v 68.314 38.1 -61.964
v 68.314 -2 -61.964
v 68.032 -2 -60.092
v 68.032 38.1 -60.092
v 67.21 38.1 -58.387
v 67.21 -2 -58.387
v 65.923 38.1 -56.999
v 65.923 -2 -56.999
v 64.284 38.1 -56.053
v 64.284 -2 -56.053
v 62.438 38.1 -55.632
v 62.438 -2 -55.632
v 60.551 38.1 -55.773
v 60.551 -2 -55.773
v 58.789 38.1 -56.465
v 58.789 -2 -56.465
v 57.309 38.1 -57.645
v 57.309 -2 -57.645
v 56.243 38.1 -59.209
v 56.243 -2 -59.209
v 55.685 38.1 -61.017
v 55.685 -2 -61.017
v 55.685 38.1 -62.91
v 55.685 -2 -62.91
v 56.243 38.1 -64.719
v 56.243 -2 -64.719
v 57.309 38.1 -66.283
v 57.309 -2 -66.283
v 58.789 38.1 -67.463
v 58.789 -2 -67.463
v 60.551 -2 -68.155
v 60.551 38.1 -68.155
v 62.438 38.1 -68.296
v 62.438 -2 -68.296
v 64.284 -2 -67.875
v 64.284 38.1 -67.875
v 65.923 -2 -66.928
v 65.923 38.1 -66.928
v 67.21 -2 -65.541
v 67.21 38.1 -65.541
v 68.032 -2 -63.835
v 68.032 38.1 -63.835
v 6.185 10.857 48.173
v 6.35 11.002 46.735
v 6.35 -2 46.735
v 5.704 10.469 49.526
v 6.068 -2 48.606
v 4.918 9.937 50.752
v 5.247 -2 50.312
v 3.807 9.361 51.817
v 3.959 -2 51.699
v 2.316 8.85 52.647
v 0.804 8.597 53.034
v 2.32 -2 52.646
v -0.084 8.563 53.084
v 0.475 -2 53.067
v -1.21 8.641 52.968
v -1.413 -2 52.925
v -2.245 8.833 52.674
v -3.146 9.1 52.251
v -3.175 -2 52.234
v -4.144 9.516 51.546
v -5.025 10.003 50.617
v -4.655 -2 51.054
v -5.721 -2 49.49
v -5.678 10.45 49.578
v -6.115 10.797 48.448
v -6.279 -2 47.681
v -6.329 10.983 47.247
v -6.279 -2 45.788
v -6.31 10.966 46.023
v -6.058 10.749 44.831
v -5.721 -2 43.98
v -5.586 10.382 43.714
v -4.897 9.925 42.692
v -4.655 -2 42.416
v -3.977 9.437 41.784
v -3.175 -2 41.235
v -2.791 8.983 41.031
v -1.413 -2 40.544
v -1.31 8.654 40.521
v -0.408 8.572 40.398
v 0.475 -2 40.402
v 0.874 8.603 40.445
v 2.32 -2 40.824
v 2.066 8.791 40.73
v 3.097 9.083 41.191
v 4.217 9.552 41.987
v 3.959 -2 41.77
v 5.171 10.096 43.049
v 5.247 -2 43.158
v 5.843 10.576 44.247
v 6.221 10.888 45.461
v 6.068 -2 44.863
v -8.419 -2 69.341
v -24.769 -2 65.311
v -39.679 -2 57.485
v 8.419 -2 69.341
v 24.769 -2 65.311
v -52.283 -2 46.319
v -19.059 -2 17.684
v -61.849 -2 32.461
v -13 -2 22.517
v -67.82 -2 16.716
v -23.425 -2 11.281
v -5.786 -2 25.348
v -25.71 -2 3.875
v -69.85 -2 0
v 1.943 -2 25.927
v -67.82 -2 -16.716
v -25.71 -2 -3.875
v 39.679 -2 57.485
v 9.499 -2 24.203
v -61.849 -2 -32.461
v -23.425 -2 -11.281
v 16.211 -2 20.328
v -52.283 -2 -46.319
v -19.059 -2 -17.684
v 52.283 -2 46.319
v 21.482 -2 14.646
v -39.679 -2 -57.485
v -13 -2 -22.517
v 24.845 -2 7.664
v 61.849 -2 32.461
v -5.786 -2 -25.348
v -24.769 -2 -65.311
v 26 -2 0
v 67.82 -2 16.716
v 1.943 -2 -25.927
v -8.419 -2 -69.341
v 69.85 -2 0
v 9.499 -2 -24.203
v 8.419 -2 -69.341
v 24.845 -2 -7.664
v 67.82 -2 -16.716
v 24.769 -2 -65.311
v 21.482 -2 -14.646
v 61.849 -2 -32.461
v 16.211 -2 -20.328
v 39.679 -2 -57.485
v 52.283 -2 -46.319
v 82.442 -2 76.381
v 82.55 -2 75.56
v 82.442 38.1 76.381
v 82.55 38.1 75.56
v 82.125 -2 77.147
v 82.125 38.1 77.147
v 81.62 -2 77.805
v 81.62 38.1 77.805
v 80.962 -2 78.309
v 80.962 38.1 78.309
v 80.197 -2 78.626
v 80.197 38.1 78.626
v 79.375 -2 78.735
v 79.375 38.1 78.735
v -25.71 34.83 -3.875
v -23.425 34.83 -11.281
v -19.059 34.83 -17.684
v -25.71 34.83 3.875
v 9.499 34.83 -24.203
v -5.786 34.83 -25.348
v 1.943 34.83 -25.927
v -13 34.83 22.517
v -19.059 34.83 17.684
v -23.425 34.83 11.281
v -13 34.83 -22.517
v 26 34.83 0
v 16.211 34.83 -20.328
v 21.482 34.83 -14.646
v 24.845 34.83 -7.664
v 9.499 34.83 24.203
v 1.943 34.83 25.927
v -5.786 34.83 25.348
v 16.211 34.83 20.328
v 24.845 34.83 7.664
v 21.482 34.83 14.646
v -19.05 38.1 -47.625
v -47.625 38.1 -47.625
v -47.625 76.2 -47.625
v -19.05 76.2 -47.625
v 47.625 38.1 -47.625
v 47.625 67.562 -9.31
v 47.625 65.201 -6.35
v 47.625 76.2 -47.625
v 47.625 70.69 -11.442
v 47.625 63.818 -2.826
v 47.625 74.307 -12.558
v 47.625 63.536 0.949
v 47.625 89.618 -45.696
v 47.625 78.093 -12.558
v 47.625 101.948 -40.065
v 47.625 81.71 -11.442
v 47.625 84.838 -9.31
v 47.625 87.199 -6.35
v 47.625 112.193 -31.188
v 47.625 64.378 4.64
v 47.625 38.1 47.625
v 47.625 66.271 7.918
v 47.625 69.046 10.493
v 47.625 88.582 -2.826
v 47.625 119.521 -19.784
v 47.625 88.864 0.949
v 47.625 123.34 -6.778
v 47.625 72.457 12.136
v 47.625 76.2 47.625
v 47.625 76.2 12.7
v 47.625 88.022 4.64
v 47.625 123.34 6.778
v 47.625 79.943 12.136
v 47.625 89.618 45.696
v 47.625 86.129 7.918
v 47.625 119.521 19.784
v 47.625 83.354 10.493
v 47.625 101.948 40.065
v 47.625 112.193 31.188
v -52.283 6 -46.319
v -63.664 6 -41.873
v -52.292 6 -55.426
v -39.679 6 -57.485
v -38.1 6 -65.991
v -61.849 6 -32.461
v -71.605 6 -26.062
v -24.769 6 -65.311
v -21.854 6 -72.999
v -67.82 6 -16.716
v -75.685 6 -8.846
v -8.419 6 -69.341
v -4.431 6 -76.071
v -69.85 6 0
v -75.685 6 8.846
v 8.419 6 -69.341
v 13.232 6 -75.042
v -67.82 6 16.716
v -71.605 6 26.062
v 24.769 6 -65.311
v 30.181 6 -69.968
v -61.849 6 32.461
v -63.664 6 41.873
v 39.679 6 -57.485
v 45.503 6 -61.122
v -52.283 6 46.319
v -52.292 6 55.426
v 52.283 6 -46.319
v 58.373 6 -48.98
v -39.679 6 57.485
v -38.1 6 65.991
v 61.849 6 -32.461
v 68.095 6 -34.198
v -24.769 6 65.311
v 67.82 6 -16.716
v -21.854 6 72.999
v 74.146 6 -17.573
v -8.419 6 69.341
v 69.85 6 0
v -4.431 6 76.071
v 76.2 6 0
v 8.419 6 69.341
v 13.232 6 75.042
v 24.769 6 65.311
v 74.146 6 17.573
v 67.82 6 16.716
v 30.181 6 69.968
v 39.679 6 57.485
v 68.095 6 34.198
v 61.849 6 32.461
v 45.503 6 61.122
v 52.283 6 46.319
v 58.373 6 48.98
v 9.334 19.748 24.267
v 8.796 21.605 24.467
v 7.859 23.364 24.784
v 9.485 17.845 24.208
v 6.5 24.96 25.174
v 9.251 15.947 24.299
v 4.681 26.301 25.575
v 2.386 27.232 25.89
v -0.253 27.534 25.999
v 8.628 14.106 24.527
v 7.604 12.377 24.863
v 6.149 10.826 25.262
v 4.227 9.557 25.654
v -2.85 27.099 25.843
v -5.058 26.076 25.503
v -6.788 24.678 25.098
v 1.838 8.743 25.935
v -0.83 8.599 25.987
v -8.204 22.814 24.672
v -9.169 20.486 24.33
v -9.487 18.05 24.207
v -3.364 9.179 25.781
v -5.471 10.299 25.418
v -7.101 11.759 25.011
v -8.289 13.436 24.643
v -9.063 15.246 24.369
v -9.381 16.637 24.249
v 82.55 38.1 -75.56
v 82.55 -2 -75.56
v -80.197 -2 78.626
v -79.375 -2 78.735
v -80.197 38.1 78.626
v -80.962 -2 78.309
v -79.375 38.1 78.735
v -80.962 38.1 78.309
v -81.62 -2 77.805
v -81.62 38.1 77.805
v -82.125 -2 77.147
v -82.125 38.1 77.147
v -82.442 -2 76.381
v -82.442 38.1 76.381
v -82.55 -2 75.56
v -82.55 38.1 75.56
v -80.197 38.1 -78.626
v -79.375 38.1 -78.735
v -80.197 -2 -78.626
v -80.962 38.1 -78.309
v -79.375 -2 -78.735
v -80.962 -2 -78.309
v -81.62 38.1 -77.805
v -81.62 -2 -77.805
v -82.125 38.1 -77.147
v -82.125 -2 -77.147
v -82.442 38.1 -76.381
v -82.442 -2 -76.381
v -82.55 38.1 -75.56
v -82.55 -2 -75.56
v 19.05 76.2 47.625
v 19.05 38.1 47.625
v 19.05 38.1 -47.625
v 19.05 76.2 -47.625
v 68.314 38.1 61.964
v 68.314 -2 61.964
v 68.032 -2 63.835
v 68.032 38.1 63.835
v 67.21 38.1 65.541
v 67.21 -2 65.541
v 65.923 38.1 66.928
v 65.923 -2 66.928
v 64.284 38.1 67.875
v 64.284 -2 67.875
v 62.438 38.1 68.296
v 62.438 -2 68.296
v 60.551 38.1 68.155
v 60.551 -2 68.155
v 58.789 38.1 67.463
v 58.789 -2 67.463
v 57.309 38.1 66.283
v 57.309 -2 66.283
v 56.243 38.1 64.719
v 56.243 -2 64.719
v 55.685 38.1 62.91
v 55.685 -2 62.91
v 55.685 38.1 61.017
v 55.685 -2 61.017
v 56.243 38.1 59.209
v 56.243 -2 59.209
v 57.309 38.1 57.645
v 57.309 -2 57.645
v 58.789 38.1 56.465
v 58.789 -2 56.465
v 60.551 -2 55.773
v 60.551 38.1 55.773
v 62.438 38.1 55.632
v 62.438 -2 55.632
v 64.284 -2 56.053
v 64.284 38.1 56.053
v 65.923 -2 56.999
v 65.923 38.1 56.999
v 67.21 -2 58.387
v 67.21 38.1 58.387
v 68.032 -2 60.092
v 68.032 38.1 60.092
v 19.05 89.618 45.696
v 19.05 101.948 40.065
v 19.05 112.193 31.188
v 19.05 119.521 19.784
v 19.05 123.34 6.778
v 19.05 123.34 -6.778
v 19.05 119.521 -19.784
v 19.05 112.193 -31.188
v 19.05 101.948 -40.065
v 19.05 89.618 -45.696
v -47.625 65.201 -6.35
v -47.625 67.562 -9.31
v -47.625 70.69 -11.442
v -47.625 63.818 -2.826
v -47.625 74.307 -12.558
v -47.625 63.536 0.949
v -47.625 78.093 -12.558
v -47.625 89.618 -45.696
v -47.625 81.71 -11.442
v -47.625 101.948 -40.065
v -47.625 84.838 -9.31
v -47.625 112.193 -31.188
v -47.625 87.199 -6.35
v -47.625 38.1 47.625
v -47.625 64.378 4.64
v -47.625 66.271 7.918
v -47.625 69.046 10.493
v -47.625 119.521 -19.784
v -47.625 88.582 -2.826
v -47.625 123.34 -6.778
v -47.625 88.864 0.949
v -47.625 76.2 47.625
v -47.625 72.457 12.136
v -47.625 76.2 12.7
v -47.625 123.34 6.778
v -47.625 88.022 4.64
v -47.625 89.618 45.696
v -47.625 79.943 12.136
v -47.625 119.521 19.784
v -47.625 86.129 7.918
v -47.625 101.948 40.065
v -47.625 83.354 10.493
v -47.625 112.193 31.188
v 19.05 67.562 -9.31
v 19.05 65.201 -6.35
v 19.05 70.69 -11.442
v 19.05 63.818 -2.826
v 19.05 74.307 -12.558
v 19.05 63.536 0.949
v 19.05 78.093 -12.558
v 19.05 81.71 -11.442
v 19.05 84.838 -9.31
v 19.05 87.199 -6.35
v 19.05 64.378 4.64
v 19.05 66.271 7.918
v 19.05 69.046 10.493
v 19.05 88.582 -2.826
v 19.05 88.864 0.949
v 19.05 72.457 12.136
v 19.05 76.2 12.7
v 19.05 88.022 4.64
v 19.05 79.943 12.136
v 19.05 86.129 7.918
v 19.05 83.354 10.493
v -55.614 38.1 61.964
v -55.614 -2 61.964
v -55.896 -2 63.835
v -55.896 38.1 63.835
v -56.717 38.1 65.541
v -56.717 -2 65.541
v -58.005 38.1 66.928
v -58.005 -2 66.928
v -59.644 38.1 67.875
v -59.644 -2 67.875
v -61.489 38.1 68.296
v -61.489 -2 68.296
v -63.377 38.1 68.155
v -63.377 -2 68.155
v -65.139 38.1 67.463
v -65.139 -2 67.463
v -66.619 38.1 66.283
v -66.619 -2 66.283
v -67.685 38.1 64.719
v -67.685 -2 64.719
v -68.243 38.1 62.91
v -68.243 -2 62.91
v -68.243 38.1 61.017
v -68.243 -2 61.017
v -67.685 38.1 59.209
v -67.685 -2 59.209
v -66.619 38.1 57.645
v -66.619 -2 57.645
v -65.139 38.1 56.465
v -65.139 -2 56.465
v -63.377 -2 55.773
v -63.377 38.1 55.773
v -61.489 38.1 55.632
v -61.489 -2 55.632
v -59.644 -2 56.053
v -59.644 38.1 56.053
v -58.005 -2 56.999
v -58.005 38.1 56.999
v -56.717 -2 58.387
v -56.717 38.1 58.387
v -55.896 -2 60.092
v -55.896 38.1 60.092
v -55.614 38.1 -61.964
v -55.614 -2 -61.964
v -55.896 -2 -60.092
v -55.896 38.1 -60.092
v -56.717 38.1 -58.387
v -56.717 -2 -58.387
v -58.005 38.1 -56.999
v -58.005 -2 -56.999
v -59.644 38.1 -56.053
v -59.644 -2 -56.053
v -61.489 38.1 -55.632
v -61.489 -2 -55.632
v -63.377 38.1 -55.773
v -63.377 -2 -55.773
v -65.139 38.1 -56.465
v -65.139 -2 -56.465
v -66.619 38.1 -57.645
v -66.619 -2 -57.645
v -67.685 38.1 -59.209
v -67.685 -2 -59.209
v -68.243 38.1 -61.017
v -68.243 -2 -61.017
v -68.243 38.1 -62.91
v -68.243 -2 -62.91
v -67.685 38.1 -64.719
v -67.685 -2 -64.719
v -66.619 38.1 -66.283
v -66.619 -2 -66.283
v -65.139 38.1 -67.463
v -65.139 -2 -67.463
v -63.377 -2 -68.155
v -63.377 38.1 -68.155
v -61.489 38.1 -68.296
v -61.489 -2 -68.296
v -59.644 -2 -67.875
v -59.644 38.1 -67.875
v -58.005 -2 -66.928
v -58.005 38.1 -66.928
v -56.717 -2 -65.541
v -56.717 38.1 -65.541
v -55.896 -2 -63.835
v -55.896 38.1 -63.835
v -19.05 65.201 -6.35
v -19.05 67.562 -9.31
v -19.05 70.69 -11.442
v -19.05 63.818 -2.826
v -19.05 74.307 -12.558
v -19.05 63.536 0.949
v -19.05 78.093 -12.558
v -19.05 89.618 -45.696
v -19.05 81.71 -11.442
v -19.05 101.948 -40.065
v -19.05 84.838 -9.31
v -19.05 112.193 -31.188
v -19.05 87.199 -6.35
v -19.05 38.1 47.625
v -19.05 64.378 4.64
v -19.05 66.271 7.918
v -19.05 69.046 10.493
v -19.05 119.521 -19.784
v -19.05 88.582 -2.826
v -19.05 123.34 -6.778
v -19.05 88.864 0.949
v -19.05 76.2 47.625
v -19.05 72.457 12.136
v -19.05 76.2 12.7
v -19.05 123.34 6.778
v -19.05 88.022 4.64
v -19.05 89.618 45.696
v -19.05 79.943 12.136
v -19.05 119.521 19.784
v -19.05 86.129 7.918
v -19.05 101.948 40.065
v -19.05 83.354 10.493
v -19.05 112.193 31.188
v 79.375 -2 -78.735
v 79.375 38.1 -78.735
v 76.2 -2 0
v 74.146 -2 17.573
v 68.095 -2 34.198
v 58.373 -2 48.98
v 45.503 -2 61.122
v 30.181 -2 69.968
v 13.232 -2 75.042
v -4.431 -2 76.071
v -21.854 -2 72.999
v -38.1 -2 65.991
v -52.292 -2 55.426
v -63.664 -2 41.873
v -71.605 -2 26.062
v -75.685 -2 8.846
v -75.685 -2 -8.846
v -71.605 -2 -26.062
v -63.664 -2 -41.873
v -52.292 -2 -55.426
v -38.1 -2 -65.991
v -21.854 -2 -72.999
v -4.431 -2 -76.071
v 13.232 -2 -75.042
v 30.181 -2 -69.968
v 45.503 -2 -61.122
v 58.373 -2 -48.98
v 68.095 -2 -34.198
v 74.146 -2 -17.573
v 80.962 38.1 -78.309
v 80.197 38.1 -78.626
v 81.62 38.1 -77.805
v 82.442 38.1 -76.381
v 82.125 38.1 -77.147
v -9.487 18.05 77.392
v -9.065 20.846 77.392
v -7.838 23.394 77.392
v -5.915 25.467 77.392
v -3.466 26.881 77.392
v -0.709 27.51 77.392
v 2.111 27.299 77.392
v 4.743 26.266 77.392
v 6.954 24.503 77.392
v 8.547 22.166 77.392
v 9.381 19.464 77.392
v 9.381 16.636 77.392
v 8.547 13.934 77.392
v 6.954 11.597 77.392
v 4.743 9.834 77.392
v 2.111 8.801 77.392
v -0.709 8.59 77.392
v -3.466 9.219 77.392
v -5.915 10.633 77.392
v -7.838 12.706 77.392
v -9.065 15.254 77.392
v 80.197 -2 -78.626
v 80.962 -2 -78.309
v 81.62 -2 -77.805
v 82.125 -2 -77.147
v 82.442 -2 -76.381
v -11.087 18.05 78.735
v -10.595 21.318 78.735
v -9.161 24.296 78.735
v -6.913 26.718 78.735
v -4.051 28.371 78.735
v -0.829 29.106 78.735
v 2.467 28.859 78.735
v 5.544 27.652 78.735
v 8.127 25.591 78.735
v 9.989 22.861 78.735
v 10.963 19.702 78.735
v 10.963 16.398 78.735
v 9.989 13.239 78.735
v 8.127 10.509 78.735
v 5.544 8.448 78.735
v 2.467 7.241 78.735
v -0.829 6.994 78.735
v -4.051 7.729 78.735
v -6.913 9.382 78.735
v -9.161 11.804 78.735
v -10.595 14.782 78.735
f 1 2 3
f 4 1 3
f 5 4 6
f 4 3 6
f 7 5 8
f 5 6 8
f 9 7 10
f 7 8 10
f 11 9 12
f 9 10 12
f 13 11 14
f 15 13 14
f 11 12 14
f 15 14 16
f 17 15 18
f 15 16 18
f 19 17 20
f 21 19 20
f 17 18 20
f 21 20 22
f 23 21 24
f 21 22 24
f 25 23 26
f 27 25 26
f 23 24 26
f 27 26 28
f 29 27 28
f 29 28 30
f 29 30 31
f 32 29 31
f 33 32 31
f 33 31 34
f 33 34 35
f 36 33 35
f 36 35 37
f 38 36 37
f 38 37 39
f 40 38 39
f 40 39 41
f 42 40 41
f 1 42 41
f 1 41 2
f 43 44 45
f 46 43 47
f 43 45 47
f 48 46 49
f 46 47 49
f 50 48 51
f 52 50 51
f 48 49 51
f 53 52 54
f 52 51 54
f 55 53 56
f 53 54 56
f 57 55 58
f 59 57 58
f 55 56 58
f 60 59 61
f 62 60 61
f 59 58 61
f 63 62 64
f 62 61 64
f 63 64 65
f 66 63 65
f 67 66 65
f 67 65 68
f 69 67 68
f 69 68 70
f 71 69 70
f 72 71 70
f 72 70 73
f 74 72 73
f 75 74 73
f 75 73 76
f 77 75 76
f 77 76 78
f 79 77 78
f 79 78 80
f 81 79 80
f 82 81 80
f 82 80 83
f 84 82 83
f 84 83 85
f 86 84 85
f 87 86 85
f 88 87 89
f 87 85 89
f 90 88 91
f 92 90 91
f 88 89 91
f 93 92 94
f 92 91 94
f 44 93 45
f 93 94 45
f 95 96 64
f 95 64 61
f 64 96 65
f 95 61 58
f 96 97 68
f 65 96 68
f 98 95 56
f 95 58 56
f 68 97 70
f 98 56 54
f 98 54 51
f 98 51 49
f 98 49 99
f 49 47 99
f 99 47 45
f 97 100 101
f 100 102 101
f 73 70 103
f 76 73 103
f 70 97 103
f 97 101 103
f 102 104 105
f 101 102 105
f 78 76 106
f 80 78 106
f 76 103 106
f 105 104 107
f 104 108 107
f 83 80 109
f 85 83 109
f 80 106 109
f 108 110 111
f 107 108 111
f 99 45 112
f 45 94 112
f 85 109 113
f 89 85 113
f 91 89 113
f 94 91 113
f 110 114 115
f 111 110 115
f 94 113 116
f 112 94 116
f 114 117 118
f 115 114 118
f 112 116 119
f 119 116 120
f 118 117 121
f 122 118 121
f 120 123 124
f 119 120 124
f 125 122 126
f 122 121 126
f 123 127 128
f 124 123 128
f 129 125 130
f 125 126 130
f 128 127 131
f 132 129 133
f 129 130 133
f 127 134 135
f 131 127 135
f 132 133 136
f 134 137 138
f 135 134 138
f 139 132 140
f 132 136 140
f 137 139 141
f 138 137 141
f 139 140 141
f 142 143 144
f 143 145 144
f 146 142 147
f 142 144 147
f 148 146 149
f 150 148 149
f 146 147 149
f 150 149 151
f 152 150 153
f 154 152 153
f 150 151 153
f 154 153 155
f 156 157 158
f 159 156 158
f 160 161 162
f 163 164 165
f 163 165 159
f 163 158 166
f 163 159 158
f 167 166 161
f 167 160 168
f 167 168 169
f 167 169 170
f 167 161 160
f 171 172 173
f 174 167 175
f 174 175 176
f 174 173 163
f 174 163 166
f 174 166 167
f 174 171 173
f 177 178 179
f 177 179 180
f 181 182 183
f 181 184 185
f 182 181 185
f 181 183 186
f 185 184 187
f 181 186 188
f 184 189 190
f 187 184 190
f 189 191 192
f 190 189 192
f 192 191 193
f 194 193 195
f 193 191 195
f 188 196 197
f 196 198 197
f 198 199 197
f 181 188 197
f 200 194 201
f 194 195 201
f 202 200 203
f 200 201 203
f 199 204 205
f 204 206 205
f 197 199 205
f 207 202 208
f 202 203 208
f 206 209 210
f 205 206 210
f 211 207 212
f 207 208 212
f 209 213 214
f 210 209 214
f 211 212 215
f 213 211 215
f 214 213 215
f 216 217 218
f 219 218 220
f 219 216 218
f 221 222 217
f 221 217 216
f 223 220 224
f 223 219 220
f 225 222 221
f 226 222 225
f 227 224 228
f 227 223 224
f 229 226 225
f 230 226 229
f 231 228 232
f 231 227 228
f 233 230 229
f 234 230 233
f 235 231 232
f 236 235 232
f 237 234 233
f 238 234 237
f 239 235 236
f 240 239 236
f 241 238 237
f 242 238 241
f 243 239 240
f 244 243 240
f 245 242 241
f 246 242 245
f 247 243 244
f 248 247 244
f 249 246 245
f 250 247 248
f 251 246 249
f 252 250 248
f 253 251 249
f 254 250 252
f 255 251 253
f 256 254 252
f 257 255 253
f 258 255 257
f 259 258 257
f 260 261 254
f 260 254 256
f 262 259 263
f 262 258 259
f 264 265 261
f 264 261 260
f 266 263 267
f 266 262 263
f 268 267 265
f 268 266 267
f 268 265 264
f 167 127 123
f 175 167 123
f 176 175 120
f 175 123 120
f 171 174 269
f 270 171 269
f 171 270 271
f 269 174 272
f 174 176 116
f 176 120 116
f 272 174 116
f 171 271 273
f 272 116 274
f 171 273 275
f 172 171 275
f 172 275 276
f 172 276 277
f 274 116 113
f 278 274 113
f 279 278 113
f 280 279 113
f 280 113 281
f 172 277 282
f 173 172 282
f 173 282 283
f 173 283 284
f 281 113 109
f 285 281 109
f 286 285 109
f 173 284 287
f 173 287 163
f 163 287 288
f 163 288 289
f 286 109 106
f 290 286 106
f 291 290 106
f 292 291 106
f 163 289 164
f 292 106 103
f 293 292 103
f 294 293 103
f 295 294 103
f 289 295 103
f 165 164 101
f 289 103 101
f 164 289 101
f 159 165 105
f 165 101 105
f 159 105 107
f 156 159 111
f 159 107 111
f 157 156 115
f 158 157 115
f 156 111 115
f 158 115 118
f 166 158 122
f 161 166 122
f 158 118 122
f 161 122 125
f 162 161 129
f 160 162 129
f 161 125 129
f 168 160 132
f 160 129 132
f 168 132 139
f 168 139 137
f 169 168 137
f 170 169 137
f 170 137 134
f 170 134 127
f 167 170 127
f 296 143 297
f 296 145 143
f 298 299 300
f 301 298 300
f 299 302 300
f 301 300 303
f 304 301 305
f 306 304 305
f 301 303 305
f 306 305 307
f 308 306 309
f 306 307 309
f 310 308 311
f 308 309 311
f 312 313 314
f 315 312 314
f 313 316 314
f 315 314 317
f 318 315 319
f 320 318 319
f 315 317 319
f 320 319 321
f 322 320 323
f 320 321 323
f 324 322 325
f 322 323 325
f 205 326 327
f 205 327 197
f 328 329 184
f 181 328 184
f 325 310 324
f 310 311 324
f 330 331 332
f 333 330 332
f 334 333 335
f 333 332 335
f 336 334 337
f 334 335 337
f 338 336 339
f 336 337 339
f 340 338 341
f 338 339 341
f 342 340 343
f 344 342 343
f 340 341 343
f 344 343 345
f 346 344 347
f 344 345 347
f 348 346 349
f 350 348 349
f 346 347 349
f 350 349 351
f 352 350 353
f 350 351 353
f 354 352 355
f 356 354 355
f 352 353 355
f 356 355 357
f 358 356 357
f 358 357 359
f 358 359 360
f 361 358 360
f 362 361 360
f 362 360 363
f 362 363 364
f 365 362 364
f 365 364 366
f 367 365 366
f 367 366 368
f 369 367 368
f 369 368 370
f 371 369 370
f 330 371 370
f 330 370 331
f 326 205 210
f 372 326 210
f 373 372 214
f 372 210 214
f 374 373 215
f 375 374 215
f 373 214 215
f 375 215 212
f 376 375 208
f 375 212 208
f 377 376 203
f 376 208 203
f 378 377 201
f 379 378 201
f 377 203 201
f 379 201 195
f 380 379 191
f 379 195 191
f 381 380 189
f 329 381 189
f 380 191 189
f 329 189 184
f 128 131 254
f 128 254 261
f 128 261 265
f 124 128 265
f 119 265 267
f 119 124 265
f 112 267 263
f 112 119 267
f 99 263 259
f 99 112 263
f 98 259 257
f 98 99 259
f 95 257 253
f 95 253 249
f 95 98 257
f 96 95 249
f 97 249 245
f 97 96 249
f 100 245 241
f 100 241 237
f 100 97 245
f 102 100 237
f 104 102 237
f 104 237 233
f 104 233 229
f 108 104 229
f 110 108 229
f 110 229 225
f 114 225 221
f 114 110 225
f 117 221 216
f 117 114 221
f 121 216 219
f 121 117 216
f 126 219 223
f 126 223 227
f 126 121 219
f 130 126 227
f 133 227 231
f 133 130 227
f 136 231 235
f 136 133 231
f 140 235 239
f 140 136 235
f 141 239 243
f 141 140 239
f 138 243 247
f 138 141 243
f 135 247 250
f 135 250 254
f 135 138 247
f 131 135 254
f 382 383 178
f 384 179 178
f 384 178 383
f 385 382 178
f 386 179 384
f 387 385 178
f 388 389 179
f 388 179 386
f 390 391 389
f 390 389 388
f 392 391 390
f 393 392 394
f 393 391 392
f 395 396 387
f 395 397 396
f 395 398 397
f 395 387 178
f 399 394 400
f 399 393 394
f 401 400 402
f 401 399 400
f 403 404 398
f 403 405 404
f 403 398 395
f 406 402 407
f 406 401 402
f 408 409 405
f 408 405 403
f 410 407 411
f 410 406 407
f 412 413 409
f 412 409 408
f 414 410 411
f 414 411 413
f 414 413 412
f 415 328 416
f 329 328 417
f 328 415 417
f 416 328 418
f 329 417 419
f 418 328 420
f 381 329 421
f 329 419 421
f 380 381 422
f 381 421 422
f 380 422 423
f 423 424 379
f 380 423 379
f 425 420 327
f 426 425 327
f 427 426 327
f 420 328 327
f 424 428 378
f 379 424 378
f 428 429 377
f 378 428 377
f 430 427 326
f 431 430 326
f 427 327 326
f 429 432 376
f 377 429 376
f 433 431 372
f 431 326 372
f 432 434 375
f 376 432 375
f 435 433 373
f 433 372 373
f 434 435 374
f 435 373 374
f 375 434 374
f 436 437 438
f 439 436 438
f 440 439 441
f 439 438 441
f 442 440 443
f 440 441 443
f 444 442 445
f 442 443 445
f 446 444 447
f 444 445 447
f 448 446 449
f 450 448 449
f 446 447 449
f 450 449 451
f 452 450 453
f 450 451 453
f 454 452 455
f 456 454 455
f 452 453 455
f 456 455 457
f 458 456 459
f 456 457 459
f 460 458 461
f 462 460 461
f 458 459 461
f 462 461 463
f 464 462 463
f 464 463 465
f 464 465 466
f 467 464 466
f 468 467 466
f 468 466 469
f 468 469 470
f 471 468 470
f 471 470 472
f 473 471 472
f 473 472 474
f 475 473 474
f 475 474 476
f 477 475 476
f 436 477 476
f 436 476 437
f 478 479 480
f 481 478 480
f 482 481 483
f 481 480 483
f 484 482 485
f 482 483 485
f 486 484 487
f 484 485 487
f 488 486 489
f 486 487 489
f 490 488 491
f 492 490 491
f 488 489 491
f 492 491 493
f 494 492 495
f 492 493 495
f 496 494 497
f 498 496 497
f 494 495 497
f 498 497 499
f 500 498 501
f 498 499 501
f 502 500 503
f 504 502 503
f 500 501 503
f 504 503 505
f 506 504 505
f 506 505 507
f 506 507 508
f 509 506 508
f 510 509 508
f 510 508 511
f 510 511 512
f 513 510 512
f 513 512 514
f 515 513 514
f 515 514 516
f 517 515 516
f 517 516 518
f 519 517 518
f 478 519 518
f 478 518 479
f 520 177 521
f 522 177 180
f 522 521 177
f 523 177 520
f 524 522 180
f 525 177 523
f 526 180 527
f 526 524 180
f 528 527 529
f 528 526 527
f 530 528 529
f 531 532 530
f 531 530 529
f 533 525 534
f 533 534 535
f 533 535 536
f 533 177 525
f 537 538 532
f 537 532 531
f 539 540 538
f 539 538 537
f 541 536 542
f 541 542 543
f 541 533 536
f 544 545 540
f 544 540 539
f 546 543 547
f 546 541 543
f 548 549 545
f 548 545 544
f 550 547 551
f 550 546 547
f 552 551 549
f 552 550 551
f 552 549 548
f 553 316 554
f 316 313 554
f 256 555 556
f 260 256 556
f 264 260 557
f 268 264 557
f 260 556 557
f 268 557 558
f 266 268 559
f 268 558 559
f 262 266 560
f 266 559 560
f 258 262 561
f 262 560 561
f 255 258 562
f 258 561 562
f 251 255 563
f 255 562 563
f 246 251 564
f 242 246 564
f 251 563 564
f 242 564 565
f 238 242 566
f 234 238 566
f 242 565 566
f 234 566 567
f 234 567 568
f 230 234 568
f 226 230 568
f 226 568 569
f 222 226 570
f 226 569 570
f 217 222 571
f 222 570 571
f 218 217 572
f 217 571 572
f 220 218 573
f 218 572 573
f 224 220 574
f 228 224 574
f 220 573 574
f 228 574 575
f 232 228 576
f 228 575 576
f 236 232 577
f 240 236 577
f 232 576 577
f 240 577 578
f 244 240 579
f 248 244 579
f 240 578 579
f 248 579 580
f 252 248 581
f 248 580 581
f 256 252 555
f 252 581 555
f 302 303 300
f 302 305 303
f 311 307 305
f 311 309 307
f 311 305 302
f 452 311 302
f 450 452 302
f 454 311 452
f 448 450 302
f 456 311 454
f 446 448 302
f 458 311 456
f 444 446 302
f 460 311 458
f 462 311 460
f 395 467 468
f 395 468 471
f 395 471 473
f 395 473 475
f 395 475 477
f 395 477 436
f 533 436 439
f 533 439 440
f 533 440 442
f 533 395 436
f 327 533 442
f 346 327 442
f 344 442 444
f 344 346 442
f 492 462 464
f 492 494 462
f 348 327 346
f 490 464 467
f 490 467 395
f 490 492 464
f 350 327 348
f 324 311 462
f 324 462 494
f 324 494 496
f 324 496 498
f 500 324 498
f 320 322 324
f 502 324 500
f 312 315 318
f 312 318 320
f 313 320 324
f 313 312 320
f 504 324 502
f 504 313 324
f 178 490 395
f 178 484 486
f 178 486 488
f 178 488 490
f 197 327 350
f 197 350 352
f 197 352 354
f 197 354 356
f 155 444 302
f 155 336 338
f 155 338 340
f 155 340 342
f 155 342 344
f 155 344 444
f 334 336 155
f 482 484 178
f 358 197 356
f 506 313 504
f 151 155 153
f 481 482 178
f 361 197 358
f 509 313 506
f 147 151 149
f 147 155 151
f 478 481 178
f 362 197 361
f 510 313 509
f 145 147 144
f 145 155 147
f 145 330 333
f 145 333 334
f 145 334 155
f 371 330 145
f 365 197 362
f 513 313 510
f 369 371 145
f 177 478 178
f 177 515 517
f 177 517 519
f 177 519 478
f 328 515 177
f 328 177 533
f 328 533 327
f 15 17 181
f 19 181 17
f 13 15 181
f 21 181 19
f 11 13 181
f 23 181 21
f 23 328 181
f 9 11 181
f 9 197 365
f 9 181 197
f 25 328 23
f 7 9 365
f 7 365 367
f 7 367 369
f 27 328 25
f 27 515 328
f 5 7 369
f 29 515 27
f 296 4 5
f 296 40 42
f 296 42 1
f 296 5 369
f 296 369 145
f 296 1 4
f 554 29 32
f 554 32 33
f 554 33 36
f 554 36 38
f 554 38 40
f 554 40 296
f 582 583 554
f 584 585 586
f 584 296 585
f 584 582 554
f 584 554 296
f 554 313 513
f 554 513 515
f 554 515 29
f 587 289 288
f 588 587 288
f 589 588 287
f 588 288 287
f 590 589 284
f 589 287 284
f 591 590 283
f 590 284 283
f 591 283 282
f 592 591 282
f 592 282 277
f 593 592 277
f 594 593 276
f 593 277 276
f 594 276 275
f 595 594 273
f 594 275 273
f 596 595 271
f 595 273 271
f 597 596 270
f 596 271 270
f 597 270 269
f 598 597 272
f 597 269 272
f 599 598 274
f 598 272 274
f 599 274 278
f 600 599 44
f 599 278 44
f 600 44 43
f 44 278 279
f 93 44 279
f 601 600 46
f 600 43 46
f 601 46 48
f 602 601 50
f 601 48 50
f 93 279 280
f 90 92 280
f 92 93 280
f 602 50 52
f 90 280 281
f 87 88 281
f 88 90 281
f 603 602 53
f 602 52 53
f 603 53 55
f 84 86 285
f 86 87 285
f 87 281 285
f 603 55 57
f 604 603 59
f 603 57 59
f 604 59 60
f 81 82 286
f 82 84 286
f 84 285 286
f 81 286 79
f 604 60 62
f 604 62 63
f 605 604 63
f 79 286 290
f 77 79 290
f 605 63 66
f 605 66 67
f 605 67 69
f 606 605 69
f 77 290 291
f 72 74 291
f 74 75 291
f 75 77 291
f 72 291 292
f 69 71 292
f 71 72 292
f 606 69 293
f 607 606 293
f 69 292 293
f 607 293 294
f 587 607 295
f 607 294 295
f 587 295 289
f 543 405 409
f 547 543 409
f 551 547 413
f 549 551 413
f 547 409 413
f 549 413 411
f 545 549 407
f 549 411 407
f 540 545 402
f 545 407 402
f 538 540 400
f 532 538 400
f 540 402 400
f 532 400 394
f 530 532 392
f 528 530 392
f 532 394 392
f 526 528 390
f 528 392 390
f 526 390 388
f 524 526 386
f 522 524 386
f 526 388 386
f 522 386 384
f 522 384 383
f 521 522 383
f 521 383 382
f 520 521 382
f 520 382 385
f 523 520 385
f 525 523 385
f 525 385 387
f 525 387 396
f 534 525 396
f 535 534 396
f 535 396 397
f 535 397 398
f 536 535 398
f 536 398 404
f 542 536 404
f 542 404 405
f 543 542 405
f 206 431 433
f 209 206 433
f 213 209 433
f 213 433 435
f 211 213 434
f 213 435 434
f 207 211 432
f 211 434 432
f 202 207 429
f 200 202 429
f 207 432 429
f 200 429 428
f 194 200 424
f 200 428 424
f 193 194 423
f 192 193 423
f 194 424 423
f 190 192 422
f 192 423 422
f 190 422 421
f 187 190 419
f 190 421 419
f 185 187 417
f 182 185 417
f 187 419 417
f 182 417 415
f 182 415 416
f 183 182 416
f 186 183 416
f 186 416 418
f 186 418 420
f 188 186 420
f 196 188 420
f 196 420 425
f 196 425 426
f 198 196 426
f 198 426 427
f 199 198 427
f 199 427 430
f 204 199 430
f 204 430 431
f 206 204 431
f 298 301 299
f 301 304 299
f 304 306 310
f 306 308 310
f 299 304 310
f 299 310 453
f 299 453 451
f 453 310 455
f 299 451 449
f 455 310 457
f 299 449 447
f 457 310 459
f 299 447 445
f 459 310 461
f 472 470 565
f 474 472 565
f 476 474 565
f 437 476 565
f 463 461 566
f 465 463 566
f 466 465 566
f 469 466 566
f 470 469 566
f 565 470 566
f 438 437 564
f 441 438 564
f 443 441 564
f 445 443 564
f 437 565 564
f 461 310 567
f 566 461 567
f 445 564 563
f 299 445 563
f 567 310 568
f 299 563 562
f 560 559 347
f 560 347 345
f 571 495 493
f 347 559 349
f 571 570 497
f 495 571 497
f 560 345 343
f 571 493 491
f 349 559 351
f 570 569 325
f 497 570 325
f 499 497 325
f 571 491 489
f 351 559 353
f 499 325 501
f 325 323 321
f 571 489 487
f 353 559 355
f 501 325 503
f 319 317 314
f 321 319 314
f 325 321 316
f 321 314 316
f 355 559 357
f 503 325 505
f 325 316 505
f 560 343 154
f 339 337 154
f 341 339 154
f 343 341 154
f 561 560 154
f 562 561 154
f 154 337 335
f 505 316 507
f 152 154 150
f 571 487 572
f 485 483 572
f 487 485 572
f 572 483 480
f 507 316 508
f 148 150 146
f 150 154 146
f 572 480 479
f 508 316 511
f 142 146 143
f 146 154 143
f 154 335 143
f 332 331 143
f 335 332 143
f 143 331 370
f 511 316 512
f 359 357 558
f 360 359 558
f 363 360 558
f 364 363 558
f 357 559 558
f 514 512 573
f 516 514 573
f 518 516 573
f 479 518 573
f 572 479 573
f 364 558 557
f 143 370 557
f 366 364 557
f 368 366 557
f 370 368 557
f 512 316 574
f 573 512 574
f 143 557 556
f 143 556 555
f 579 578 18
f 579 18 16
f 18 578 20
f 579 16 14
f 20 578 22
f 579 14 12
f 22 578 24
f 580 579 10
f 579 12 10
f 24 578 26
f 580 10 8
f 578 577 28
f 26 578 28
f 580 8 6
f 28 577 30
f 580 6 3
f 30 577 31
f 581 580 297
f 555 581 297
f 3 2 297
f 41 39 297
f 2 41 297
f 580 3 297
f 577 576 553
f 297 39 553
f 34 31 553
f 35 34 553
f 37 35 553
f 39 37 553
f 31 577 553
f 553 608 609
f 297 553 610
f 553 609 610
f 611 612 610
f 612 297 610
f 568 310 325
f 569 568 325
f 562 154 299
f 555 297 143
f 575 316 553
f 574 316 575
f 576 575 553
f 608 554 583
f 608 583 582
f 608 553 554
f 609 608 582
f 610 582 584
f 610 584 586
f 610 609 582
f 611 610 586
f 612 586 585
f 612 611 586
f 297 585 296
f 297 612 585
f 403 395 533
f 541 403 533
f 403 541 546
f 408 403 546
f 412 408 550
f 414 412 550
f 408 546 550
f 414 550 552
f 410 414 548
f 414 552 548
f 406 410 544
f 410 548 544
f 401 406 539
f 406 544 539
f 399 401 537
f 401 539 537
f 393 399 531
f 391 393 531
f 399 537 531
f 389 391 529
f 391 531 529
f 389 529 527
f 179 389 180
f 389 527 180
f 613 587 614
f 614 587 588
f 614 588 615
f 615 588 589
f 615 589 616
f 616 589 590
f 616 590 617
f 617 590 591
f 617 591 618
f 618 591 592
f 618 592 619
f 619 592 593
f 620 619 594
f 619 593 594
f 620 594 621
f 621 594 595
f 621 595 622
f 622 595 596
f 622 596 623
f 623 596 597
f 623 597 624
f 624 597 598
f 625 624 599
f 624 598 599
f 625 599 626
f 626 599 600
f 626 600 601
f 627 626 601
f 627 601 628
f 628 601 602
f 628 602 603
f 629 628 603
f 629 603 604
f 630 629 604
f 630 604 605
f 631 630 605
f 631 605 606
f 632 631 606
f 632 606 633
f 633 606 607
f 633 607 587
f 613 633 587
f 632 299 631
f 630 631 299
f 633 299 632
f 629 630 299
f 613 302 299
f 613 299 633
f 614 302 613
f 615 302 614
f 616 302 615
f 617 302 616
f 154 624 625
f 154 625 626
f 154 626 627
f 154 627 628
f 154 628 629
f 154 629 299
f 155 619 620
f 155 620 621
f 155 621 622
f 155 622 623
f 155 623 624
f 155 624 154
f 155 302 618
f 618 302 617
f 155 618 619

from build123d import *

# Parameters (mm, degrees)
SKETCH1_W                              = 165.1
SKETCH1_H                              = 157.469327732
BOSS_EXTRUDE1_DEPTH                    = 38.1
BOSS_EXTRUDE1_DEPTH_BACK               = 2
SKETCH2_W                              = 95.25
SKETCH2_H                              = 95.25
BOSS_EXTRUDE2_DEPTH                    = 38.1
BOSS_EXTRUDE3_START                    = -95.25
BOSS_EXTRUDE3_DEPTH                    = 95.25
SKETCH4_R                              = 12.7
CUT_EXTRUDE1_DEPTH                     = 131.175
SKETCH5_W                              = 38.1
SKETCH5_H                              = 85.725
CUT_EXTRUDE3_DEPTH                     = 127.359663866
FILLET1_R                              = 3.175
SKETCH6_R                              = 26
CUT_EXTRUDE4_DEPTH                     = 36.83
SKETCH9_R                              = 76.2
SKETCH9_R_2                            = 69.85
CUT_EXTRUDE5_DEPTH                     = 8
F_1_2_14_NPSM_TAPPED_HOLE1_D           = 18.9738
F_1_2_14_NPSM_TAPPED_HOLE1_DEPTH       = 63.5
F_1_2_14_NPSM_TAPPED_HOLE1_CSINK_D     = 22.1742
F_1_2_14_NPSM_TAPPED_HOLE1_CSINK_ANGLE = 100
F_1_2_14_NPSM_TAPPED_HOLE1_TIP         = 5.700304607
SKETCH16_R                             = 6.35
CUT_EXTRUDE6_DEPTH                     = 25
SKETCH17_R                             = 6.35
CUT_EXTRUDE7_DEPTH                     = 126.825


with BuildPart() as part:
    # Sketch1 → Boss-Extrude1 (new body, two sides)
    with BuildSketch(Plane(origin=(0, 0, 0), x_dir=(1, 0, 0), z_dir=(0, 1, 0))) as boss_extrude1_sk:
        Rectangle(SKETCH1_W, SKETCH1_H)
    extrude(amount=BOSS_EXTRUDE1_DEPTH)
    extrude(boss_extrude1_sk.sketch, amount=-BOSS_EXTRUDE1_DEPTH_BACK)

    # Sketch2 → Boss-Extrude2 (add)
    with BuildSketch(Plane(origin=(0, 38.1, 0), x_dir=(1, 0, 0), z_dir=(0, 1, 0))):
        Rectangle(SKETCH2_W, SKETCH2_H)
    extrude(amount=BOSS_EXTRUDE2_DEPTH)

    # Sketch3 → Boss-Extrude3 (add)
    with BuildSketch(Plane.ZY.offset(47.625).offset(BOSS_EXTRUDE3_START)):
        with BuildLine():
            Line((-47.625, 76.2), (47.625, 76.2))
            ThreePointArc((47.625, 76.2), (0, 123.825), (-47.625, 76.2))
        make_face()
    extrude(amount=BOSS_EXTRUDE3_DEPTH)

    # Sketch4 → Cut-Extrude1 (cut, through all)
    with BuildSketch(Plane.ZY.offset(47.625)):
        with Locations((0, 76.2)):
            Circle(SKETCH4_R)
    extrude(amount=-CUT_EXTRUDE1_DEPTH, mode=Mode.SUBTRACT)

    # Sketch5 → Cut-Extrude3 (cut, through all)
    with BuildSketch(Plane.XY.offset(47.625)):
        with Locations((0, 80.9625)):
            Rectangle(SKETCH5_W, SKETCH5_H)
    extrude(amount=-CUT_EXTRUDE3_DEPTH, mode=Mode.SUBTRACT)

    # Fillet1
    fillet1_edges = [part.edges().sort_by_distance(p)[0] for p in [
        (82.55, 18.05, 78.734663866),
        (-82.55, 18.05, 78.734663866),
        (-82.55, 18.05, -78.734663866),
        (82.55, 18.05, -78.734663866),
    ]]
    fillet(fillet1_edges, radius=FILLET1_R)

    # Sketch6 → Cut-Extrude4 (cut)
    with BuildSketch(Plane.XZ.offset(2)):
        Circle(SKETCH6_R)
    extrude(amount=-CUT_EXTRUDE4_DEPTH, mode=Mode.SUBTRACT)

    # Sketch9 → Cut-Extrude5 (cut)
    with BuildSketch(Plane.XZ.offset(2)):
        Circle(SKETCH9_R)
        Circle(SKETCH9_R_2, mode=Mode.SUBTRACT)
    extrude(amount=-CUT_EXTRUDE5_DEPTH, mode=Mode.SUBTRACT)

    # 1/2-14 NPSM Tapped Hole1
    with Locations(Plane.XY.offset(78.734663866)):
        with Locations((0, 18.05)):
            CounterSinkHole(F_1_2_14_NPSM_TAPPED_HOLE1_D / 2, F_1_2_14_NPSM_TAPPED_HOLE1_CSINK_D / 2, depth=F_1_2_14_NPSM_TAPPED_HOLE1_DEPTH, counter_sink_angle=F_1_2_14_NPSM_TAPPED_HOLE1_CSINK_ANGLE)
            with Locations((0, 0, -(F_1_2_14_NPSM_TAPPED_HOLE1_DEPTH + F_1_2_14_NPSM_TAPPED_HOLE1_TIP / 2))):  # 118° drill point
                Cone(0, F_1_2_14_NPSM_TAPPED_HOLE1_D / 2, F_1_2_14_NPSM_TAPPED_HOLE1_TIP, mode=Mode.SUBTRACT)

    # Sketch16 → Cut-Extrude6 (cut)
    with BuildSketch(Plane.XZ.offset(2)):
        with Locations((0, 46.734663866)):
            Circle(SKETCH16_R)
    extrude(amount=-CUT_EXTRUDE6_DEPTH, mode=Mode.SUBTRACT)

    # Sketch17 → Cut-Extrude7 (cut, through all)
    with BuildSketch(Plane.XZ.offset(2)):
        with Locations((-61.963767235, 61.963767235)):
            Circle(SKETCH17_R)
        with Locations((61.963767235, 61.963767235)):
            Circle(SKETCH17_R)
        with Locations((61.963767235, -61.963767235)):
            Circle(SKETCH17_R)
        with Locations((-61.963767235, -61.963767235)):
            Circle(SKETCH17_R)
    extrude(amount=-CUT_EXTRUDE7_DEPTH, mode=Mode.SUBTRACT)


solid = part.part
